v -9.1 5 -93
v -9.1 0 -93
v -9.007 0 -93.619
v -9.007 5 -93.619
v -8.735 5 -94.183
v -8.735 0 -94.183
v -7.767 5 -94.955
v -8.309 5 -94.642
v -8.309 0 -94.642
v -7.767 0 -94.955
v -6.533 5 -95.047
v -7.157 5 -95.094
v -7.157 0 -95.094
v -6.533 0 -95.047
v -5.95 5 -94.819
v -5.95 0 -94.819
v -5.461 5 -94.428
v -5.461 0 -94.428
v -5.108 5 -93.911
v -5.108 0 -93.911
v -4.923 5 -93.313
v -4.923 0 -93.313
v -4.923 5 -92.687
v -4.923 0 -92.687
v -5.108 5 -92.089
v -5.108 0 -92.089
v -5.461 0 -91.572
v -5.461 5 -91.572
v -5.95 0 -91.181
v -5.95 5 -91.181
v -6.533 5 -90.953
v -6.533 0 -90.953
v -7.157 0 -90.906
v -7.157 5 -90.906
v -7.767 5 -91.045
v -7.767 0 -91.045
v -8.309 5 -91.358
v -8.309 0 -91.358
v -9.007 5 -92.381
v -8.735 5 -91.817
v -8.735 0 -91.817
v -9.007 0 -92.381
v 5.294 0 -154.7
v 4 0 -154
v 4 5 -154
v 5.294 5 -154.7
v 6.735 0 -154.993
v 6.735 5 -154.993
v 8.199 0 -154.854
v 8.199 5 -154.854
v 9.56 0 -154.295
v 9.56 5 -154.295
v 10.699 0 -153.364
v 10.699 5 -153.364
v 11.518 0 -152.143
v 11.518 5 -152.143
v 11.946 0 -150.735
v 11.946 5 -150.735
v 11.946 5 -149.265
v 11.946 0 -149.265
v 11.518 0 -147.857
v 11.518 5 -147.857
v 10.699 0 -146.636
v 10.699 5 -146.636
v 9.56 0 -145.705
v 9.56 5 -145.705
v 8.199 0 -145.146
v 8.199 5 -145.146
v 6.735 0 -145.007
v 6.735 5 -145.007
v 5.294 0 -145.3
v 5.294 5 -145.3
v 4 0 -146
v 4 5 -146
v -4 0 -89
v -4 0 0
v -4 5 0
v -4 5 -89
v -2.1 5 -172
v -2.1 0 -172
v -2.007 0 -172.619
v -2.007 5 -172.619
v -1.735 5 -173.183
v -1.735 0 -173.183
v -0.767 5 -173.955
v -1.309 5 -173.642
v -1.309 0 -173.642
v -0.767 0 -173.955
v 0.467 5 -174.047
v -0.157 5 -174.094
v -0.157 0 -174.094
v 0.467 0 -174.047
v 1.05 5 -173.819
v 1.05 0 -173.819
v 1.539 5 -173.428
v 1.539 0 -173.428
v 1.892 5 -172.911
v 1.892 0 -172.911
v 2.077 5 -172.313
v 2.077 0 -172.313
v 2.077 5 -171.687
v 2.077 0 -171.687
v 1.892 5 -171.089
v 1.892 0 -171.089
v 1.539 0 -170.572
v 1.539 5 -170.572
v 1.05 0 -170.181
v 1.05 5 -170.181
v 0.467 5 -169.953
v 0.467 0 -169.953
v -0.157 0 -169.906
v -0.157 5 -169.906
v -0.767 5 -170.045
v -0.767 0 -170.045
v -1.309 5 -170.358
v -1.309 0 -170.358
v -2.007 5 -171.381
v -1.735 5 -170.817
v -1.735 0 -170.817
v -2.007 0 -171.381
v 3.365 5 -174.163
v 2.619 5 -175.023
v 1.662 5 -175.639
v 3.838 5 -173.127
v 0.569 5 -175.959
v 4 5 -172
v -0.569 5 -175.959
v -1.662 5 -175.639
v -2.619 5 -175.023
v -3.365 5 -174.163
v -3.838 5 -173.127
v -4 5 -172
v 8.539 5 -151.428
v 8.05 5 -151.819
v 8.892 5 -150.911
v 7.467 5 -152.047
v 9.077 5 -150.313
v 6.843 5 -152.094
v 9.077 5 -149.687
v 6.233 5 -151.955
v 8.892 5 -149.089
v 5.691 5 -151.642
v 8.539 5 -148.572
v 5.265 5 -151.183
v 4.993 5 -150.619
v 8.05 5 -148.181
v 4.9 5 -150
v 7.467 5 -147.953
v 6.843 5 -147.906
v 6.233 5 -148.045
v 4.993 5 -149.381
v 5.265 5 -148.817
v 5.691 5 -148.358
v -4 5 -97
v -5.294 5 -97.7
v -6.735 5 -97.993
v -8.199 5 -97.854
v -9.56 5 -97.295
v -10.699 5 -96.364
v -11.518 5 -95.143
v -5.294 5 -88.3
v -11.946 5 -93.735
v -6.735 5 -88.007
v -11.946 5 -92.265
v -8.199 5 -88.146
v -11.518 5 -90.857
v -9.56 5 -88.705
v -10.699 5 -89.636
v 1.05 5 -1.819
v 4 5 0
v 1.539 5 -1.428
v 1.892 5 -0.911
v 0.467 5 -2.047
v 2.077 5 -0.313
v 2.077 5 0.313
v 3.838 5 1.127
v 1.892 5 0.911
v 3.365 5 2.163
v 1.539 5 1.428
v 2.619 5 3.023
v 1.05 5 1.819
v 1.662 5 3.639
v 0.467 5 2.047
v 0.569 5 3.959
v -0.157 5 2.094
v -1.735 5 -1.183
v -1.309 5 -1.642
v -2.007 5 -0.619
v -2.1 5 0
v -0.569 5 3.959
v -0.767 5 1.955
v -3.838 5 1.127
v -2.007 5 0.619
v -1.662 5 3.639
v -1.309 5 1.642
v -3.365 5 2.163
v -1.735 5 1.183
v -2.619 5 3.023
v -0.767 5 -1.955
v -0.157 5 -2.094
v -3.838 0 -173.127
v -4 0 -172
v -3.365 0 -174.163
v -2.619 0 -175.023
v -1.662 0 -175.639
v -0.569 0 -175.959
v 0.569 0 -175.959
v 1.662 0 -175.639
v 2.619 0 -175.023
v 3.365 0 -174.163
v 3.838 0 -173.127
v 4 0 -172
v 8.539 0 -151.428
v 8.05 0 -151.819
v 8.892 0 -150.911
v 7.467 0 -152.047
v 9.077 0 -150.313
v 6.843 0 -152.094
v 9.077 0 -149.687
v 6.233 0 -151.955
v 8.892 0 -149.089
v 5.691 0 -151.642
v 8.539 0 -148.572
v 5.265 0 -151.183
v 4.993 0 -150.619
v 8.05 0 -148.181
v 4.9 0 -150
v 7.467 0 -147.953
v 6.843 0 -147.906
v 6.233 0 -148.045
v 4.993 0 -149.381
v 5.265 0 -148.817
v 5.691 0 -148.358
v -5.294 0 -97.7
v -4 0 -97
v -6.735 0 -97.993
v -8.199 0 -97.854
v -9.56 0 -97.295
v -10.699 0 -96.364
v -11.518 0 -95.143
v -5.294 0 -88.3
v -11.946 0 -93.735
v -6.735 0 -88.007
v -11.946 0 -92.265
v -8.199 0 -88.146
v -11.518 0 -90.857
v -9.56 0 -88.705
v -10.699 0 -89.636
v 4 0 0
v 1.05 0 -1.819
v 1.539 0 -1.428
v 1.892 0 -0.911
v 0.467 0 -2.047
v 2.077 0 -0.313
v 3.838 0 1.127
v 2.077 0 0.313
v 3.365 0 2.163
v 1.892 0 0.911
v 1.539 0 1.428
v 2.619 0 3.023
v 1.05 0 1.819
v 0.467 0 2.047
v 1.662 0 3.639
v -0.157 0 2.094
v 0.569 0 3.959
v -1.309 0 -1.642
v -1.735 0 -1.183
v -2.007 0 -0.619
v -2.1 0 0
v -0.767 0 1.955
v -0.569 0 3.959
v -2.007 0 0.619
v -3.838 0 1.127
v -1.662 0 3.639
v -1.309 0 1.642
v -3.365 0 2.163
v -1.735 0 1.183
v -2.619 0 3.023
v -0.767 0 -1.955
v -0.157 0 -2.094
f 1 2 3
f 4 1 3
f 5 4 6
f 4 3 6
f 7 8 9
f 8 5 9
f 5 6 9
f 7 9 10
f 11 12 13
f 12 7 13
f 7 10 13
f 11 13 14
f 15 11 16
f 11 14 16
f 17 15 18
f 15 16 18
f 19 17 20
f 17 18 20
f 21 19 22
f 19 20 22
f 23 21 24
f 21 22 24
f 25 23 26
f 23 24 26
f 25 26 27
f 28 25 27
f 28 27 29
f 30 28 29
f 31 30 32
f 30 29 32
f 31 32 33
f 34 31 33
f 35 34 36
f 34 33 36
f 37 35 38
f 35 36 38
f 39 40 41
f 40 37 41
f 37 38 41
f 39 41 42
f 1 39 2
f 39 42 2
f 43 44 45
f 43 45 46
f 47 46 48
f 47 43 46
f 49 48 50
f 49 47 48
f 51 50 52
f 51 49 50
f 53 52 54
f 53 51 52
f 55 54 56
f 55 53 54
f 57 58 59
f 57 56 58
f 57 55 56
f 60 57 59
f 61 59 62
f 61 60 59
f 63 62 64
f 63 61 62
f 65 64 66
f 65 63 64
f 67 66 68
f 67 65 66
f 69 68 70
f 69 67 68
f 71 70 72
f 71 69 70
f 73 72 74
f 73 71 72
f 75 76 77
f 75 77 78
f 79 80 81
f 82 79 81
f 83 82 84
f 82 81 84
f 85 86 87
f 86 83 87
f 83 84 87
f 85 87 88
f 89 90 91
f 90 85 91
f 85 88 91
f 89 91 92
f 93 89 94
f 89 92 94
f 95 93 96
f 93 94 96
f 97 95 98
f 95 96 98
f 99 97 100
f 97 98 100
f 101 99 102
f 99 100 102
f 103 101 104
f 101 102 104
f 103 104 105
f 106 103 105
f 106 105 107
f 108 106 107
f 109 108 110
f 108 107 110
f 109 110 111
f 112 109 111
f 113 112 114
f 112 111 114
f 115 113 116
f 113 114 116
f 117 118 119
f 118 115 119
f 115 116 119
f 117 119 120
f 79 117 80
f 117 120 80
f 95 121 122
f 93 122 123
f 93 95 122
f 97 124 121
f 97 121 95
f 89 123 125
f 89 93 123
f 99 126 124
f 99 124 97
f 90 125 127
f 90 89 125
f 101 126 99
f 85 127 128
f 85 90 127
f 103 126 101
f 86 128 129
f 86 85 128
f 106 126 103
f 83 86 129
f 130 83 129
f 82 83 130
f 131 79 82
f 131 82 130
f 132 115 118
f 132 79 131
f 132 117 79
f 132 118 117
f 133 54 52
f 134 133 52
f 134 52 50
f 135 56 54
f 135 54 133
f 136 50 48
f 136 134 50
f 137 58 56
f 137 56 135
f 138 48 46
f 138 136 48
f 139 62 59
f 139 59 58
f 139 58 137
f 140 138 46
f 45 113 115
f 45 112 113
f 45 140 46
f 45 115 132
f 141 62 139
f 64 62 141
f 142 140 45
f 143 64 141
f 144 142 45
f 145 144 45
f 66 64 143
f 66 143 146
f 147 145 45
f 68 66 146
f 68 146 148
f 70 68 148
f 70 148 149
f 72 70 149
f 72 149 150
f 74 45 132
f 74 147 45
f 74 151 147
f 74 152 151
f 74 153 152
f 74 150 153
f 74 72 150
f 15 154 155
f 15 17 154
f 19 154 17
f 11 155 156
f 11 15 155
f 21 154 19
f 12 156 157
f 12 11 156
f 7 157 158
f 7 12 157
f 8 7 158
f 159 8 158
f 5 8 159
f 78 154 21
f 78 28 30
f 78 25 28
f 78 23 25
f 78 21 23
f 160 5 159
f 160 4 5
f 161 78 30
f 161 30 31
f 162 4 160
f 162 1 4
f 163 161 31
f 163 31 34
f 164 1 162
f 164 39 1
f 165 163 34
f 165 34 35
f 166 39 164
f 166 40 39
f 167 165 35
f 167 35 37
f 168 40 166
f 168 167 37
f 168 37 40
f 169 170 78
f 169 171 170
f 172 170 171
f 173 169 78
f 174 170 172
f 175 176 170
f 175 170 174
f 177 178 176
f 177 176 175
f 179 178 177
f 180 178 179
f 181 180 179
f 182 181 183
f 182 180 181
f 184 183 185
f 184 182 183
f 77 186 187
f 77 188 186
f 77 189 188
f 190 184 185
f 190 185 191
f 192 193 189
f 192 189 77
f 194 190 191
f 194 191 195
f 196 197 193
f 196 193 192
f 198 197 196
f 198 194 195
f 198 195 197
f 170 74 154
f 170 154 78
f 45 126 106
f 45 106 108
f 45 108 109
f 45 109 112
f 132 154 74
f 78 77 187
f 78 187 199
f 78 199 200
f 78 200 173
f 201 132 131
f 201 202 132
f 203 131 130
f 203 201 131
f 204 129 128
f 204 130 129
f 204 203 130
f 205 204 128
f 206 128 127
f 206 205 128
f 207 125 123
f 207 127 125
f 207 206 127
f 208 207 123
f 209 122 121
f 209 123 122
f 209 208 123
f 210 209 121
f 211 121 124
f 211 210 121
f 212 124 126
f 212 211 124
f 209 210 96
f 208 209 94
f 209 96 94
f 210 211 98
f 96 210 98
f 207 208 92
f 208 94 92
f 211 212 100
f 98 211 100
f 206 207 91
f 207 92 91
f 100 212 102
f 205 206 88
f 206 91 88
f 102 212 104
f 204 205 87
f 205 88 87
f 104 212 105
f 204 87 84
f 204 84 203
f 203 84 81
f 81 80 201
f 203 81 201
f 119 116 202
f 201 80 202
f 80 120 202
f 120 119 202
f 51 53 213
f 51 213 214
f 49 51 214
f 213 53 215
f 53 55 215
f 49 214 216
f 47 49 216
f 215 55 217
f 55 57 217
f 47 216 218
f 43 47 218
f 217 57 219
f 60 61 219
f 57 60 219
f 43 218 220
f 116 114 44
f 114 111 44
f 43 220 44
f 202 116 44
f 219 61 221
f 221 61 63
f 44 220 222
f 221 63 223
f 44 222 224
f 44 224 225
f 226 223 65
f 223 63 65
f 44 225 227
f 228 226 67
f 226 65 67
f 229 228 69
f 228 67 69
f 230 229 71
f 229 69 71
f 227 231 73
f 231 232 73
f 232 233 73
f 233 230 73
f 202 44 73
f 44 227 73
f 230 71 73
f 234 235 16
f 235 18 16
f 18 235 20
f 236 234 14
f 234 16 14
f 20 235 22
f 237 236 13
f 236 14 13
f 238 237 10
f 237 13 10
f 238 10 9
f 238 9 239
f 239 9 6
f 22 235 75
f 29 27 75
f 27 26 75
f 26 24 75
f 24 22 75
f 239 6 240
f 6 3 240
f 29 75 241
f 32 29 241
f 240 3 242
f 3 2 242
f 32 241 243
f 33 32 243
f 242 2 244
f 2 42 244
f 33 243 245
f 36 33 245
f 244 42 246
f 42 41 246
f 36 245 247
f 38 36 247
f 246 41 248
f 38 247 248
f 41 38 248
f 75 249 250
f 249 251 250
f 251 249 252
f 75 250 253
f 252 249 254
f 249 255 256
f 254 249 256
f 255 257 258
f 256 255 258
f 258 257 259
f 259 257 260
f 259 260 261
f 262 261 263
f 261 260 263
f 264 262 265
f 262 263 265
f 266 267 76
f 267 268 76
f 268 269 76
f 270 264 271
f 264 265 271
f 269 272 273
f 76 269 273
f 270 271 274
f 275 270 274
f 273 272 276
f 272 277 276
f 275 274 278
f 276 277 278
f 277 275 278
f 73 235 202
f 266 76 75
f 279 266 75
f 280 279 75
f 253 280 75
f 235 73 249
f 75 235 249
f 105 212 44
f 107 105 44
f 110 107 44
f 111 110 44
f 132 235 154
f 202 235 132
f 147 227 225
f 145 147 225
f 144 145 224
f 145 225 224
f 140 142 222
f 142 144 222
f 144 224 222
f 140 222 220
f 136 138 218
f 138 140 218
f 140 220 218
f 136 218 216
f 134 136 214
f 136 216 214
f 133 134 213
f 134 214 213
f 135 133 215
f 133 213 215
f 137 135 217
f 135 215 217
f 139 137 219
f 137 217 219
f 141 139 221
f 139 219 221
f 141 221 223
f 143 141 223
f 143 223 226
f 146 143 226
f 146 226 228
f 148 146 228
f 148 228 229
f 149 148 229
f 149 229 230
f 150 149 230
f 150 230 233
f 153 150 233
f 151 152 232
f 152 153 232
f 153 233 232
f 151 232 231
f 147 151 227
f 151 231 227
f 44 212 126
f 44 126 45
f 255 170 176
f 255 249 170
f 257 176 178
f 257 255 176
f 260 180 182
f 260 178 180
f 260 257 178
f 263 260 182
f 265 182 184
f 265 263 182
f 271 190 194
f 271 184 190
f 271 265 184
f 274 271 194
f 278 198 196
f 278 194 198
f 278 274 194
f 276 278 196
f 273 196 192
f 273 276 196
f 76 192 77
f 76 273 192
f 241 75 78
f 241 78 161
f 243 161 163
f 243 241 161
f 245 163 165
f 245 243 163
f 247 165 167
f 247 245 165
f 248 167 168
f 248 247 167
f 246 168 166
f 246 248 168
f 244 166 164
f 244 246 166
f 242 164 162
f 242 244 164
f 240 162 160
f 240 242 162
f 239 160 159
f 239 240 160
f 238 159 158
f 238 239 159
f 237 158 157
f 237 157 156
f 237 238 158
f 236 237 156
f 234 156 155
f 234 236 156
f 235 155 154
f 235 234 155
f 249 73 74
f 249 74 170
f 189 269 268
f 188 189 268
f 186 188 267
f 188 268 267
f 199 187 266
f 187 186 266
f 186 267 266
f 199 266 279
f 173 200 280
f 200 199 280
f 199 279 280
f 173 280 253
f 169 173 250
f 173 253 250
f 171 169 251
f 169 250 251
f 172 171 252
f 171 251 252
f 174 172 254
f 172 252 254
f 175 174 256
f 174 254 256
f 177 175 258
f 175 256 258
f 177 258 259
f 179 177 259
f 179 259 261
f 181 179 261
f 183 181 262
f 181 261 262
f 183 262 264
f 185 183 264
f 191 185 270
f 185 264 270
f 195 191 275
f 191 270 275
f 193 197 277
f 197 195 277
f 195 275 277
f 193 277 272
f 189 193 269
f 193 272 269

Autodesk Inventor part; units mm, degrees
ref_plane "YZ Plane" through (0, 0, 0) normal (1, 0, 0) x (0, 1, 0)
ref_plane "XZ Plane" through (0, 0, 0) normal (0, 1, 0) x (-1, 0, 0)
ref_plane "XY Plane" through (0, 0, 0) normal (0, 0, 1) x (1, 0, 0)
sketch "Sketch1" plane through (0, 0, 0) normal (0, 1, 0) x (-1, 0, 0)
  line L0 (0, 0) -> (0, -172) construction
  line L1 (4, 0) -> (4, -172)
  line L2 (-4, -172) -> (-4, 0)
  arc A0 (4, 0) -> (-4, 0) centre (0, 0) ccw
  arc A1 (-4, -172) -> (4, -172) centre (0, -172) ccw
  circle A2 centre (0, 0) radius 2.1
  circle A3 centre (0, -172) radius 2.1
  circle A4 centre (7, -93) radius 2.1
  circle A5 centre (7, -93) radius 5
  circle A6 centre (-7, -150) radius 2.1
  circle A7 centre (-7, -150) radius 5
  point P0 (0, -86)
  point P1 (4, -89)
  point P2 (4, -99.3597)
  point P3 (4, -100.6403)
  point P4 (4, -97)
  point P5 (-4, -146)
  point P6 (-4, -154)
  dimension "d0" = 172
  dimension "d1" = 8
  dimension "d2" = 4.2
  dimension "d3" = 4.2
  dimension "d8" = 4.2
  dimension "d9" = 93
  dimension "d10" = 3
  dimension "d11" = 10
  dimension "d12" = 4.2
  dimension "d13" = 10
  dimension "d15" = 3
  dimension "d16" = 150
extrude "Extrusion1" add sketch "Sketch1" along normal blind 5
